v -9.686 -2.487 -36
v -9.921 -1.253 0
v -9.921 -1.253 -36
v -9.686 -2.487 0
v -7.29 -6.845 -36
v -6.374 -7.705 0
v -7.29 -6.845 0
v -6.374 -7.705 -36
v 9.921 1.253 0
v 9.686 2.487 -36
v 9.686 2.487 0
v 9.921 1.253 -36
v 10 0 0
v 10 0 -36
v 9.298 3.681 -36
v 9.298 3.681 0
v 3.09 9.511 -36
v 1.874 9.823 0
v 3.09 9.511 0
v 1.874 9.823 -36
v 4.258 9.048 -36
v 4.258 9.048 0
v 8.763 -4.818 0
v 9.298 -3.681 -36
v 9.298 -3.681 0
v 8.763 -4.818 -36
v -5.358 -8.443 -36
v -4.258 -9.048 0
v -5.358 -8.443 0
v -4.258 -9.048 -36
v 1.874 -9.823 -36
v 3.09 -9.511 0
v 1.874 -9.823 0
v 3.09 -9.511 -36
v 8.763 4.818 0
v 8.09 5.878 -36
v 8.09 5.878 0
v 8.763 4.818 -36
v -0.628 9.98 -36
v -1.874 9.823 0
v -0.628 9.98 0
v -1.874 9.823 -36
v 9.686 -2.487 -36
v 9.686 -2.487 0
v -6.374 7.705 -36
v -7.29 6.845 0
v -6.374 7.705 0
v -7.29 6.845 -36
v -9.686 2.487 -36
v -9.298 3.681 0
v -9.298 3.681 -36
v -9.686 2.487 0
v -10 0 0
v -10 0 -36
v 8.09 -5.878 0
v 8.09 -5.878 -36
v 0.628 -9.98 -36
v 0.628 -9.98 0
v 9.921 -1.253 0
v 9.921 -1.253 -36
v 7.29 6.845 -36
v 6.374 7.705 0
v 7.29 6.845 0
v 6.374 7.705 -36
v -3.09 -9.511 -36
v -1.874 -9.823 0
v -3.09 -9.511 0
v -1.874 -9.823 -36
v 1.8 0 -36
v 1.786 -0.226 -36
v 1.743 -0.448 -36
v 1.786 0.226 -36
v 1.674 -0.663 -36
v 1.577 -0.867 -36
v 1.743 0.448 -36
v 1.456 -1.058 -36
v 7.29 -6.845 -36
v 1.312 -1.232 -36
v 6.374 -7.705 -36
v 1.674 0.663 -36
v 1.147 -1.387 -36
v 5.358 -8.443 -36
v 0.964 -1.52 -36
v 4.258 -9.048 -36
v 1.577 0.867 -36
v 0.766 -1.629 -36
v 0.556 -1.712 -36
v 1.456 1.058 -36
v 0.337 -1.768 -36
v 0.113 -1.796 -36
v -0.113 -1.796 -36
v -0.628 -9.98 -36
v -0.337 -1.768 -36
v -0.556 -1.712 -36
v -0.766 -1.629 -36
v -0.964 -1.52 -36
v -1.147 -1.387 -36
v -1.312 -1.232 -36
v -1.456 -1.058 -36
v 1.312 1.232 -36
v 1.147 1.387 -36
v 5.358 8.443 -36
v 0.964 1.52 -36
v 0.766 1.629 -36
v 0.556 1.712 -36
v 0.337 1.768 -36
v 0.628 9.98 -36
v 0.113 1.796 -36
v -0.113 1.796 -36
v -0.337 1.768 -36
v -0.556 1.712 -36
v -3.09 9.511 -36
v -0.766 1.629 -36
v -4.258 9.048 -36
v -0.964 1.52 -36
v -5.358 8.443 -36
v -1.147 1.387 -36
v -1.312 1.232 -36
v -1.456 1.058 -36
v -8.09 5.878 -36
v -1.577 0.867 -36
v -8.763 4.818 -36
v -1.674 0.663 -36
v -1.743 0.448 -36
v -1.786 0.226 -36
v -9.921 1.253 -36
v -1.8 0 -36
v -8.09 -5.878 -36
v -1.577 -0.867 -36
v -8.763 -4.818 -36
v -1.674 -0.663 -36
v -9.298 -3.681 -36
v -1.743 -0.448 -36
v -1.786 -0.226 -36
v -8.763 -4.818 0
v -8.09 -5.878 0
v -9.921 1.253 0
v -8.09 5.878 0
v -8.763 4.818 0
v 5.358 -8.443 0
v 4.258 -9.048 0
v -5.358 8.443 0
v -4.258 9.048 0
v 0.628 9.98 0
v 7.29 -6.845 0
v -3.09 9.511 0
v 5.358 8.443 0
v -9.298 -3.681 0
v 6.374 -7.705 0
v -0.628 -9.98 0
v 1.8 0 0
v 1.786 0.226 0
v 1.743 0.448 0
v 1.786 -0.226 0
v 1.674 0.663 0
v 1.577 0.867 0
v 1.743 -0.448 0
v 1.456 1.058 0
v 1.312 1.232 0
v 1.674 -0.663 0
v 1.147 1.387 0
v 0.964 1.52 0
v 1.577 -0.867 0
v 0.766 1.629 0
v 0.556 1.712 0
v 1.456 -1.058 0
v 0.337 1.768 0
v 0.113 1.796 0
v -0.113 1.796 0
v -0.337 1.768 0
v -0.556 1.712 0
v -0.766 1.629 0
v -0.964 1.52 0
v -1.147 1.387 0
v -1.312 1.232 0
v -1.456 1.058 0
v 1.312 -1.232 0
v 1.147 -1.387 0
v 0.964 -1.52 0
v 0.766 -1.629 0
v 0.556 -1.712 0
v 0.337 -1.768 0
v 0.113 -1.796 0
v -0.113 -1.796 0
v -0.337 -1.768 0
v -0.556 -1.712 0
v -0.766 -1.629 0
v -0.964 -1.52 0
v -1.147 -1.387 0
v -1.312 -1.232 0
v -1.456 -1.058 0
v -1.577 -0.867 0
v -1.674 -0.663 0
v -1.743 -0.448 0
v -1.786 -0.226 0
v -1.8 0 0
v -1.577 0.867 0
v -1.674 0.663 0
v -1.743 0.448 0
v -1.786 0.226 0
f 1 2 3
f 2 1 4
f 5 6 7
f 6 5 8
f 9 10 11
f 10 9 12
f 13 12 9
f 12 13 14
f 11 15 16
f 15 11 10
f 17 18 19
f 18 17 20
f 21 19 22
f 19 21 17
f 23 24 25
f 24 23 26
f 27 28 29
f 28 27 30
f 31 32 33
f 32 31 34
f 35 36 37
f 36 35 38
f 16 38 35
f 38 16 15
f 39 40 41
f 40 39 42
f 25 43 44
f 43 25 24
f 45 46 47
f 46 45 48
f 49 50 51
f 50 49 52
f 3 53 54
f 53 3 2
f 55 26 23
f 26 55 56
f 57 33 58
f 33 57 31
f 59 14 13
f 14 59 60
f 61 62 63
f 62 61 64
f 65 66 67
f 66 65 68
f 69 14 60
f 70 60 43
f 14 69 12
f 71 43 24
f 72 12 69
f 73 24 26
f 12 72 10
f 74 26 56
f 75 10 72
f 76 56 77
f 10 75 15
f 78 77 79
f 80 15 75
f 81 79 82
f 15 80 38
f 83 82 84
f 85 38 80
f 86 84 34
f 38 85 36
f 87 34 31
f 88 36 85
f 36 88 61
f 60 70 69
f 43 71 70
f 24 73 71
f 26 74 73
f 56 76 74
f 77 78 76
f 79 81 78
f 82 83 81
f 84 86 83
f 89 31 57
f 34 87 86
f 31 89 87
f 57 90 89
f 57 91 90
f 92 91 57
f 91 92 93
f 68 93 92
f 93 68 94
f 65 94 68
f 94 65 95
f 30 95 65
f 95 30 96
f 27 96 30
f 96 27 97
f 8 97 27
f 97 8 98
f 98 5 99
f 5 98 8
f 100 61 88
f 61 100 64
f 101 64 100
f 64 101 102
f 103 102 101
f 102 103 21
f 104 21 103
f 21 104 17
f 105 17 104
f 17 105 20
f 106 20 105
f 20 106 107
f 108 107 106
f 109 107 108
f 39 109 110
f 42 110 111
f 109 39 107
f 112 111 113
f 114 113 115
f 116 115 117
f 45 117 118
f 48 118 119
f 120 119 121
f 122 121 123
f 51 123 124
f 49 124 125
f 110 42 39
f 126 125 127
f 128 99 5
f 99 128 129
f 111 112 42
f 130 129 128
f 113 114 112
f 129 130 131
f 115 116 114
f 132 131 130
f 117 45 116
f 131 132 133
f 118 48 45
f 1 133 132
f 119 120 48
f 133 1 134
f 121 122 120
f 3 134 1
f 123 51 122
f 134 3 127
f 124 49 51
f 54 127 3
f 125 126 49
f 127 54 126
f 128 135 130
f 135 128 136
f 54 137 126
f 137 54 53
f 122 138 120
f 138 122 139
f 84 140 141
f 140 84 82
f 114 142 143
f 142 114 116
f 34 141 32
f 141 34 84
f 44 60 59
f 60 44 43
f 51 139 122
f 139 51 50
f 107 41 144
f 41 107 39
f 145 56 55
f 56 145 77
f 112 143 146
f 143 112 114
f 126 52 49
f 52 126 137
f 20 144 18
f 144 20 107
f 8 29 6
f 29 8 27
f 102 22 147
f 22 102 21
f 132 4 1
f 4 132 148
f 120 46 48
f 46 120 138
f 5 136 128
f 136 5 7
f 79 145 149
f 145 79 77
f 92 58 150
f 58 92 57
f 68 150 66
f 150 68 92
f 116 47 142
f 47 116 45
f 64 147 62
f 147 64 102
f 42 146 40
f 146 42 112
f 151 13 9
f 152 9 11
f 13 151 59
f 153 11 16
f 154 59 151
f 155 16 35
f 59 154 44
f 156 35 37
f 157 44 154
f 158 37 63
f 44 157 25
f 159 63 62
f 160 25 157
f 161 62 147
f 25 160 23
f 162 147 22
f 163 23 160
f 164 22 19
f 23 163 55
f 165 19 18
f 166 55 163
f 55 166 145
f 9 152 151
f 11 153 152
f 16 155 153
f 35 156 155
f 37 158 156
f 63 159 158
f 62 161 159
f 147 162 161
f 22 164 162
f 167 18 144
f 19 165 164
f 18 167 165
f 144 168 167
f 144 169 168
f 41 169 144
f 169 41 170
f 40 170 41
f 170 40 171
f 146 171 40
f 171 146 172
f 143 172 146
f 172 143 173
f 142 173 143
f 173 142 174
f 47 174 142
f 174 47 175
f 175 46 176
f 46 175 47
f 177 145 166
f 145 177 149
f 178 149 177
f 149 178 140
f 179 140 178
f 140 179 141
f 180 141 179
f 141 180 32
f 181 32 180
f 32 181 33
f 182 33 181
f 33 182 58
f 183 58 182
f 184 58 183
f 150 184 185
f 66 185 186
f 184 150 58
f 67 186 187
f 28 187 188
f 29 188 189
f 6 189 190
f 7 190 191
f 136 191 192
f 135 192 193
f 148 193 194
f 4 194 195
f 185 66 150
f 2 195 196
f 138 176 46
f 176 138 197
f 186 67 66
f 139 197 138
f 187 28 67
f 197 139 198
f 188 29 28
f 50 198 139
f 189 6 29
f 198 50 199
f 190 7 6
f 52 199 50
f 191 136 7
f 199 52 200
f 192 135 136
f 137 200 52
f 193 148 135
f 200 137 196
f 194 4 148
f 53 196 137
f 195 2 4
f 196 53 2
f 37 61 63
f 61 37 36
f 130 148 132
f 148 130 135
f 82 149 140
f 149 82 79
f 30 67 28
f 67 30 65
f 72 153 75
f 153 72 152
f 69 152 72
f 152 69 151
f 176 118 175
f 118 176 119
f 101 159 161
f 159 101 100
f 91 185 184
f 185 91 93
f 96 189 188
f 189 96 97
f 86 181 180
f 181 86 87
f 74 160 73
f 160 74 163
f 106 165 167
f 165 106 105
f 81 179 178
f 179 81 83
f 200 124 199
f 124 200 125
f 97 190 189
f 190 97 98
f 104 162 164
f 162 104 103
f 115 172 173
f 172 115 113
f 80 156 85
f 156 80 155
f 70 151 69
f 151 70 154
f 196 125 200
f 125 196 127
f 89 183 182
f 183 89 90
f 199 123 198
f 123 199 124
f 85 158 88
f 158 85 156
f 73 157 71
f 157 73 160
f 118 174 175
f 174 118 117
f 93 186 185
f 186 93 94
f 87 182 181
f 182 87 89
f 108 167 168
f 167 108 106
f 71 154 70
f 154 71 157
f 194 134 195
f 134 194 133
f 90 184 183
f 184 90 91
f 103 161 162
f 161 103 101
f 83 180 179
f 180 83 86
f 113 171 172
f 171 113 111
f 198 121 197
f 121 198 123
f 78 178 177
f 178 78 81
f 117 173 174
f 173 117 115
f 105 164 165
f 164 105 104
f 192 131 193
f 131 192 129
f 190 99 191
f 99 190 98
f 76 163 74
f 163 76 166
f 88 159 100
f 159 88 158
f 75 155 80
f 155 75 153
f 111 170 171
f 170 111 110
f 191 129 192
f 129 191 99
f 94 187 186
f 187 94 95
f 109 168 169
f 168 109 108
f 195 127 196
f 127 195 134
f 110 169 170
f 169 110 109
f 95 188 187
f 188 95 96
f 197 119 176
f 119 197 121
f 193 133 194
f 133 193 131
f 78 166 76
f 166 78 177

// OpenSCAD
$fn = 50;


difference() {
	union() {
		translate(v = [0, 0, -36.0000000000]) {
			cylinder(h = 36, r = 10.0000000000);
		}
		cylinder(h = 0, r = 16.0000000000);
	}
	union() {
		#translate(v = [0, 0, -36]) {
			cylinder(h = 36, r = 1.8000000000);
		}
	}
}
